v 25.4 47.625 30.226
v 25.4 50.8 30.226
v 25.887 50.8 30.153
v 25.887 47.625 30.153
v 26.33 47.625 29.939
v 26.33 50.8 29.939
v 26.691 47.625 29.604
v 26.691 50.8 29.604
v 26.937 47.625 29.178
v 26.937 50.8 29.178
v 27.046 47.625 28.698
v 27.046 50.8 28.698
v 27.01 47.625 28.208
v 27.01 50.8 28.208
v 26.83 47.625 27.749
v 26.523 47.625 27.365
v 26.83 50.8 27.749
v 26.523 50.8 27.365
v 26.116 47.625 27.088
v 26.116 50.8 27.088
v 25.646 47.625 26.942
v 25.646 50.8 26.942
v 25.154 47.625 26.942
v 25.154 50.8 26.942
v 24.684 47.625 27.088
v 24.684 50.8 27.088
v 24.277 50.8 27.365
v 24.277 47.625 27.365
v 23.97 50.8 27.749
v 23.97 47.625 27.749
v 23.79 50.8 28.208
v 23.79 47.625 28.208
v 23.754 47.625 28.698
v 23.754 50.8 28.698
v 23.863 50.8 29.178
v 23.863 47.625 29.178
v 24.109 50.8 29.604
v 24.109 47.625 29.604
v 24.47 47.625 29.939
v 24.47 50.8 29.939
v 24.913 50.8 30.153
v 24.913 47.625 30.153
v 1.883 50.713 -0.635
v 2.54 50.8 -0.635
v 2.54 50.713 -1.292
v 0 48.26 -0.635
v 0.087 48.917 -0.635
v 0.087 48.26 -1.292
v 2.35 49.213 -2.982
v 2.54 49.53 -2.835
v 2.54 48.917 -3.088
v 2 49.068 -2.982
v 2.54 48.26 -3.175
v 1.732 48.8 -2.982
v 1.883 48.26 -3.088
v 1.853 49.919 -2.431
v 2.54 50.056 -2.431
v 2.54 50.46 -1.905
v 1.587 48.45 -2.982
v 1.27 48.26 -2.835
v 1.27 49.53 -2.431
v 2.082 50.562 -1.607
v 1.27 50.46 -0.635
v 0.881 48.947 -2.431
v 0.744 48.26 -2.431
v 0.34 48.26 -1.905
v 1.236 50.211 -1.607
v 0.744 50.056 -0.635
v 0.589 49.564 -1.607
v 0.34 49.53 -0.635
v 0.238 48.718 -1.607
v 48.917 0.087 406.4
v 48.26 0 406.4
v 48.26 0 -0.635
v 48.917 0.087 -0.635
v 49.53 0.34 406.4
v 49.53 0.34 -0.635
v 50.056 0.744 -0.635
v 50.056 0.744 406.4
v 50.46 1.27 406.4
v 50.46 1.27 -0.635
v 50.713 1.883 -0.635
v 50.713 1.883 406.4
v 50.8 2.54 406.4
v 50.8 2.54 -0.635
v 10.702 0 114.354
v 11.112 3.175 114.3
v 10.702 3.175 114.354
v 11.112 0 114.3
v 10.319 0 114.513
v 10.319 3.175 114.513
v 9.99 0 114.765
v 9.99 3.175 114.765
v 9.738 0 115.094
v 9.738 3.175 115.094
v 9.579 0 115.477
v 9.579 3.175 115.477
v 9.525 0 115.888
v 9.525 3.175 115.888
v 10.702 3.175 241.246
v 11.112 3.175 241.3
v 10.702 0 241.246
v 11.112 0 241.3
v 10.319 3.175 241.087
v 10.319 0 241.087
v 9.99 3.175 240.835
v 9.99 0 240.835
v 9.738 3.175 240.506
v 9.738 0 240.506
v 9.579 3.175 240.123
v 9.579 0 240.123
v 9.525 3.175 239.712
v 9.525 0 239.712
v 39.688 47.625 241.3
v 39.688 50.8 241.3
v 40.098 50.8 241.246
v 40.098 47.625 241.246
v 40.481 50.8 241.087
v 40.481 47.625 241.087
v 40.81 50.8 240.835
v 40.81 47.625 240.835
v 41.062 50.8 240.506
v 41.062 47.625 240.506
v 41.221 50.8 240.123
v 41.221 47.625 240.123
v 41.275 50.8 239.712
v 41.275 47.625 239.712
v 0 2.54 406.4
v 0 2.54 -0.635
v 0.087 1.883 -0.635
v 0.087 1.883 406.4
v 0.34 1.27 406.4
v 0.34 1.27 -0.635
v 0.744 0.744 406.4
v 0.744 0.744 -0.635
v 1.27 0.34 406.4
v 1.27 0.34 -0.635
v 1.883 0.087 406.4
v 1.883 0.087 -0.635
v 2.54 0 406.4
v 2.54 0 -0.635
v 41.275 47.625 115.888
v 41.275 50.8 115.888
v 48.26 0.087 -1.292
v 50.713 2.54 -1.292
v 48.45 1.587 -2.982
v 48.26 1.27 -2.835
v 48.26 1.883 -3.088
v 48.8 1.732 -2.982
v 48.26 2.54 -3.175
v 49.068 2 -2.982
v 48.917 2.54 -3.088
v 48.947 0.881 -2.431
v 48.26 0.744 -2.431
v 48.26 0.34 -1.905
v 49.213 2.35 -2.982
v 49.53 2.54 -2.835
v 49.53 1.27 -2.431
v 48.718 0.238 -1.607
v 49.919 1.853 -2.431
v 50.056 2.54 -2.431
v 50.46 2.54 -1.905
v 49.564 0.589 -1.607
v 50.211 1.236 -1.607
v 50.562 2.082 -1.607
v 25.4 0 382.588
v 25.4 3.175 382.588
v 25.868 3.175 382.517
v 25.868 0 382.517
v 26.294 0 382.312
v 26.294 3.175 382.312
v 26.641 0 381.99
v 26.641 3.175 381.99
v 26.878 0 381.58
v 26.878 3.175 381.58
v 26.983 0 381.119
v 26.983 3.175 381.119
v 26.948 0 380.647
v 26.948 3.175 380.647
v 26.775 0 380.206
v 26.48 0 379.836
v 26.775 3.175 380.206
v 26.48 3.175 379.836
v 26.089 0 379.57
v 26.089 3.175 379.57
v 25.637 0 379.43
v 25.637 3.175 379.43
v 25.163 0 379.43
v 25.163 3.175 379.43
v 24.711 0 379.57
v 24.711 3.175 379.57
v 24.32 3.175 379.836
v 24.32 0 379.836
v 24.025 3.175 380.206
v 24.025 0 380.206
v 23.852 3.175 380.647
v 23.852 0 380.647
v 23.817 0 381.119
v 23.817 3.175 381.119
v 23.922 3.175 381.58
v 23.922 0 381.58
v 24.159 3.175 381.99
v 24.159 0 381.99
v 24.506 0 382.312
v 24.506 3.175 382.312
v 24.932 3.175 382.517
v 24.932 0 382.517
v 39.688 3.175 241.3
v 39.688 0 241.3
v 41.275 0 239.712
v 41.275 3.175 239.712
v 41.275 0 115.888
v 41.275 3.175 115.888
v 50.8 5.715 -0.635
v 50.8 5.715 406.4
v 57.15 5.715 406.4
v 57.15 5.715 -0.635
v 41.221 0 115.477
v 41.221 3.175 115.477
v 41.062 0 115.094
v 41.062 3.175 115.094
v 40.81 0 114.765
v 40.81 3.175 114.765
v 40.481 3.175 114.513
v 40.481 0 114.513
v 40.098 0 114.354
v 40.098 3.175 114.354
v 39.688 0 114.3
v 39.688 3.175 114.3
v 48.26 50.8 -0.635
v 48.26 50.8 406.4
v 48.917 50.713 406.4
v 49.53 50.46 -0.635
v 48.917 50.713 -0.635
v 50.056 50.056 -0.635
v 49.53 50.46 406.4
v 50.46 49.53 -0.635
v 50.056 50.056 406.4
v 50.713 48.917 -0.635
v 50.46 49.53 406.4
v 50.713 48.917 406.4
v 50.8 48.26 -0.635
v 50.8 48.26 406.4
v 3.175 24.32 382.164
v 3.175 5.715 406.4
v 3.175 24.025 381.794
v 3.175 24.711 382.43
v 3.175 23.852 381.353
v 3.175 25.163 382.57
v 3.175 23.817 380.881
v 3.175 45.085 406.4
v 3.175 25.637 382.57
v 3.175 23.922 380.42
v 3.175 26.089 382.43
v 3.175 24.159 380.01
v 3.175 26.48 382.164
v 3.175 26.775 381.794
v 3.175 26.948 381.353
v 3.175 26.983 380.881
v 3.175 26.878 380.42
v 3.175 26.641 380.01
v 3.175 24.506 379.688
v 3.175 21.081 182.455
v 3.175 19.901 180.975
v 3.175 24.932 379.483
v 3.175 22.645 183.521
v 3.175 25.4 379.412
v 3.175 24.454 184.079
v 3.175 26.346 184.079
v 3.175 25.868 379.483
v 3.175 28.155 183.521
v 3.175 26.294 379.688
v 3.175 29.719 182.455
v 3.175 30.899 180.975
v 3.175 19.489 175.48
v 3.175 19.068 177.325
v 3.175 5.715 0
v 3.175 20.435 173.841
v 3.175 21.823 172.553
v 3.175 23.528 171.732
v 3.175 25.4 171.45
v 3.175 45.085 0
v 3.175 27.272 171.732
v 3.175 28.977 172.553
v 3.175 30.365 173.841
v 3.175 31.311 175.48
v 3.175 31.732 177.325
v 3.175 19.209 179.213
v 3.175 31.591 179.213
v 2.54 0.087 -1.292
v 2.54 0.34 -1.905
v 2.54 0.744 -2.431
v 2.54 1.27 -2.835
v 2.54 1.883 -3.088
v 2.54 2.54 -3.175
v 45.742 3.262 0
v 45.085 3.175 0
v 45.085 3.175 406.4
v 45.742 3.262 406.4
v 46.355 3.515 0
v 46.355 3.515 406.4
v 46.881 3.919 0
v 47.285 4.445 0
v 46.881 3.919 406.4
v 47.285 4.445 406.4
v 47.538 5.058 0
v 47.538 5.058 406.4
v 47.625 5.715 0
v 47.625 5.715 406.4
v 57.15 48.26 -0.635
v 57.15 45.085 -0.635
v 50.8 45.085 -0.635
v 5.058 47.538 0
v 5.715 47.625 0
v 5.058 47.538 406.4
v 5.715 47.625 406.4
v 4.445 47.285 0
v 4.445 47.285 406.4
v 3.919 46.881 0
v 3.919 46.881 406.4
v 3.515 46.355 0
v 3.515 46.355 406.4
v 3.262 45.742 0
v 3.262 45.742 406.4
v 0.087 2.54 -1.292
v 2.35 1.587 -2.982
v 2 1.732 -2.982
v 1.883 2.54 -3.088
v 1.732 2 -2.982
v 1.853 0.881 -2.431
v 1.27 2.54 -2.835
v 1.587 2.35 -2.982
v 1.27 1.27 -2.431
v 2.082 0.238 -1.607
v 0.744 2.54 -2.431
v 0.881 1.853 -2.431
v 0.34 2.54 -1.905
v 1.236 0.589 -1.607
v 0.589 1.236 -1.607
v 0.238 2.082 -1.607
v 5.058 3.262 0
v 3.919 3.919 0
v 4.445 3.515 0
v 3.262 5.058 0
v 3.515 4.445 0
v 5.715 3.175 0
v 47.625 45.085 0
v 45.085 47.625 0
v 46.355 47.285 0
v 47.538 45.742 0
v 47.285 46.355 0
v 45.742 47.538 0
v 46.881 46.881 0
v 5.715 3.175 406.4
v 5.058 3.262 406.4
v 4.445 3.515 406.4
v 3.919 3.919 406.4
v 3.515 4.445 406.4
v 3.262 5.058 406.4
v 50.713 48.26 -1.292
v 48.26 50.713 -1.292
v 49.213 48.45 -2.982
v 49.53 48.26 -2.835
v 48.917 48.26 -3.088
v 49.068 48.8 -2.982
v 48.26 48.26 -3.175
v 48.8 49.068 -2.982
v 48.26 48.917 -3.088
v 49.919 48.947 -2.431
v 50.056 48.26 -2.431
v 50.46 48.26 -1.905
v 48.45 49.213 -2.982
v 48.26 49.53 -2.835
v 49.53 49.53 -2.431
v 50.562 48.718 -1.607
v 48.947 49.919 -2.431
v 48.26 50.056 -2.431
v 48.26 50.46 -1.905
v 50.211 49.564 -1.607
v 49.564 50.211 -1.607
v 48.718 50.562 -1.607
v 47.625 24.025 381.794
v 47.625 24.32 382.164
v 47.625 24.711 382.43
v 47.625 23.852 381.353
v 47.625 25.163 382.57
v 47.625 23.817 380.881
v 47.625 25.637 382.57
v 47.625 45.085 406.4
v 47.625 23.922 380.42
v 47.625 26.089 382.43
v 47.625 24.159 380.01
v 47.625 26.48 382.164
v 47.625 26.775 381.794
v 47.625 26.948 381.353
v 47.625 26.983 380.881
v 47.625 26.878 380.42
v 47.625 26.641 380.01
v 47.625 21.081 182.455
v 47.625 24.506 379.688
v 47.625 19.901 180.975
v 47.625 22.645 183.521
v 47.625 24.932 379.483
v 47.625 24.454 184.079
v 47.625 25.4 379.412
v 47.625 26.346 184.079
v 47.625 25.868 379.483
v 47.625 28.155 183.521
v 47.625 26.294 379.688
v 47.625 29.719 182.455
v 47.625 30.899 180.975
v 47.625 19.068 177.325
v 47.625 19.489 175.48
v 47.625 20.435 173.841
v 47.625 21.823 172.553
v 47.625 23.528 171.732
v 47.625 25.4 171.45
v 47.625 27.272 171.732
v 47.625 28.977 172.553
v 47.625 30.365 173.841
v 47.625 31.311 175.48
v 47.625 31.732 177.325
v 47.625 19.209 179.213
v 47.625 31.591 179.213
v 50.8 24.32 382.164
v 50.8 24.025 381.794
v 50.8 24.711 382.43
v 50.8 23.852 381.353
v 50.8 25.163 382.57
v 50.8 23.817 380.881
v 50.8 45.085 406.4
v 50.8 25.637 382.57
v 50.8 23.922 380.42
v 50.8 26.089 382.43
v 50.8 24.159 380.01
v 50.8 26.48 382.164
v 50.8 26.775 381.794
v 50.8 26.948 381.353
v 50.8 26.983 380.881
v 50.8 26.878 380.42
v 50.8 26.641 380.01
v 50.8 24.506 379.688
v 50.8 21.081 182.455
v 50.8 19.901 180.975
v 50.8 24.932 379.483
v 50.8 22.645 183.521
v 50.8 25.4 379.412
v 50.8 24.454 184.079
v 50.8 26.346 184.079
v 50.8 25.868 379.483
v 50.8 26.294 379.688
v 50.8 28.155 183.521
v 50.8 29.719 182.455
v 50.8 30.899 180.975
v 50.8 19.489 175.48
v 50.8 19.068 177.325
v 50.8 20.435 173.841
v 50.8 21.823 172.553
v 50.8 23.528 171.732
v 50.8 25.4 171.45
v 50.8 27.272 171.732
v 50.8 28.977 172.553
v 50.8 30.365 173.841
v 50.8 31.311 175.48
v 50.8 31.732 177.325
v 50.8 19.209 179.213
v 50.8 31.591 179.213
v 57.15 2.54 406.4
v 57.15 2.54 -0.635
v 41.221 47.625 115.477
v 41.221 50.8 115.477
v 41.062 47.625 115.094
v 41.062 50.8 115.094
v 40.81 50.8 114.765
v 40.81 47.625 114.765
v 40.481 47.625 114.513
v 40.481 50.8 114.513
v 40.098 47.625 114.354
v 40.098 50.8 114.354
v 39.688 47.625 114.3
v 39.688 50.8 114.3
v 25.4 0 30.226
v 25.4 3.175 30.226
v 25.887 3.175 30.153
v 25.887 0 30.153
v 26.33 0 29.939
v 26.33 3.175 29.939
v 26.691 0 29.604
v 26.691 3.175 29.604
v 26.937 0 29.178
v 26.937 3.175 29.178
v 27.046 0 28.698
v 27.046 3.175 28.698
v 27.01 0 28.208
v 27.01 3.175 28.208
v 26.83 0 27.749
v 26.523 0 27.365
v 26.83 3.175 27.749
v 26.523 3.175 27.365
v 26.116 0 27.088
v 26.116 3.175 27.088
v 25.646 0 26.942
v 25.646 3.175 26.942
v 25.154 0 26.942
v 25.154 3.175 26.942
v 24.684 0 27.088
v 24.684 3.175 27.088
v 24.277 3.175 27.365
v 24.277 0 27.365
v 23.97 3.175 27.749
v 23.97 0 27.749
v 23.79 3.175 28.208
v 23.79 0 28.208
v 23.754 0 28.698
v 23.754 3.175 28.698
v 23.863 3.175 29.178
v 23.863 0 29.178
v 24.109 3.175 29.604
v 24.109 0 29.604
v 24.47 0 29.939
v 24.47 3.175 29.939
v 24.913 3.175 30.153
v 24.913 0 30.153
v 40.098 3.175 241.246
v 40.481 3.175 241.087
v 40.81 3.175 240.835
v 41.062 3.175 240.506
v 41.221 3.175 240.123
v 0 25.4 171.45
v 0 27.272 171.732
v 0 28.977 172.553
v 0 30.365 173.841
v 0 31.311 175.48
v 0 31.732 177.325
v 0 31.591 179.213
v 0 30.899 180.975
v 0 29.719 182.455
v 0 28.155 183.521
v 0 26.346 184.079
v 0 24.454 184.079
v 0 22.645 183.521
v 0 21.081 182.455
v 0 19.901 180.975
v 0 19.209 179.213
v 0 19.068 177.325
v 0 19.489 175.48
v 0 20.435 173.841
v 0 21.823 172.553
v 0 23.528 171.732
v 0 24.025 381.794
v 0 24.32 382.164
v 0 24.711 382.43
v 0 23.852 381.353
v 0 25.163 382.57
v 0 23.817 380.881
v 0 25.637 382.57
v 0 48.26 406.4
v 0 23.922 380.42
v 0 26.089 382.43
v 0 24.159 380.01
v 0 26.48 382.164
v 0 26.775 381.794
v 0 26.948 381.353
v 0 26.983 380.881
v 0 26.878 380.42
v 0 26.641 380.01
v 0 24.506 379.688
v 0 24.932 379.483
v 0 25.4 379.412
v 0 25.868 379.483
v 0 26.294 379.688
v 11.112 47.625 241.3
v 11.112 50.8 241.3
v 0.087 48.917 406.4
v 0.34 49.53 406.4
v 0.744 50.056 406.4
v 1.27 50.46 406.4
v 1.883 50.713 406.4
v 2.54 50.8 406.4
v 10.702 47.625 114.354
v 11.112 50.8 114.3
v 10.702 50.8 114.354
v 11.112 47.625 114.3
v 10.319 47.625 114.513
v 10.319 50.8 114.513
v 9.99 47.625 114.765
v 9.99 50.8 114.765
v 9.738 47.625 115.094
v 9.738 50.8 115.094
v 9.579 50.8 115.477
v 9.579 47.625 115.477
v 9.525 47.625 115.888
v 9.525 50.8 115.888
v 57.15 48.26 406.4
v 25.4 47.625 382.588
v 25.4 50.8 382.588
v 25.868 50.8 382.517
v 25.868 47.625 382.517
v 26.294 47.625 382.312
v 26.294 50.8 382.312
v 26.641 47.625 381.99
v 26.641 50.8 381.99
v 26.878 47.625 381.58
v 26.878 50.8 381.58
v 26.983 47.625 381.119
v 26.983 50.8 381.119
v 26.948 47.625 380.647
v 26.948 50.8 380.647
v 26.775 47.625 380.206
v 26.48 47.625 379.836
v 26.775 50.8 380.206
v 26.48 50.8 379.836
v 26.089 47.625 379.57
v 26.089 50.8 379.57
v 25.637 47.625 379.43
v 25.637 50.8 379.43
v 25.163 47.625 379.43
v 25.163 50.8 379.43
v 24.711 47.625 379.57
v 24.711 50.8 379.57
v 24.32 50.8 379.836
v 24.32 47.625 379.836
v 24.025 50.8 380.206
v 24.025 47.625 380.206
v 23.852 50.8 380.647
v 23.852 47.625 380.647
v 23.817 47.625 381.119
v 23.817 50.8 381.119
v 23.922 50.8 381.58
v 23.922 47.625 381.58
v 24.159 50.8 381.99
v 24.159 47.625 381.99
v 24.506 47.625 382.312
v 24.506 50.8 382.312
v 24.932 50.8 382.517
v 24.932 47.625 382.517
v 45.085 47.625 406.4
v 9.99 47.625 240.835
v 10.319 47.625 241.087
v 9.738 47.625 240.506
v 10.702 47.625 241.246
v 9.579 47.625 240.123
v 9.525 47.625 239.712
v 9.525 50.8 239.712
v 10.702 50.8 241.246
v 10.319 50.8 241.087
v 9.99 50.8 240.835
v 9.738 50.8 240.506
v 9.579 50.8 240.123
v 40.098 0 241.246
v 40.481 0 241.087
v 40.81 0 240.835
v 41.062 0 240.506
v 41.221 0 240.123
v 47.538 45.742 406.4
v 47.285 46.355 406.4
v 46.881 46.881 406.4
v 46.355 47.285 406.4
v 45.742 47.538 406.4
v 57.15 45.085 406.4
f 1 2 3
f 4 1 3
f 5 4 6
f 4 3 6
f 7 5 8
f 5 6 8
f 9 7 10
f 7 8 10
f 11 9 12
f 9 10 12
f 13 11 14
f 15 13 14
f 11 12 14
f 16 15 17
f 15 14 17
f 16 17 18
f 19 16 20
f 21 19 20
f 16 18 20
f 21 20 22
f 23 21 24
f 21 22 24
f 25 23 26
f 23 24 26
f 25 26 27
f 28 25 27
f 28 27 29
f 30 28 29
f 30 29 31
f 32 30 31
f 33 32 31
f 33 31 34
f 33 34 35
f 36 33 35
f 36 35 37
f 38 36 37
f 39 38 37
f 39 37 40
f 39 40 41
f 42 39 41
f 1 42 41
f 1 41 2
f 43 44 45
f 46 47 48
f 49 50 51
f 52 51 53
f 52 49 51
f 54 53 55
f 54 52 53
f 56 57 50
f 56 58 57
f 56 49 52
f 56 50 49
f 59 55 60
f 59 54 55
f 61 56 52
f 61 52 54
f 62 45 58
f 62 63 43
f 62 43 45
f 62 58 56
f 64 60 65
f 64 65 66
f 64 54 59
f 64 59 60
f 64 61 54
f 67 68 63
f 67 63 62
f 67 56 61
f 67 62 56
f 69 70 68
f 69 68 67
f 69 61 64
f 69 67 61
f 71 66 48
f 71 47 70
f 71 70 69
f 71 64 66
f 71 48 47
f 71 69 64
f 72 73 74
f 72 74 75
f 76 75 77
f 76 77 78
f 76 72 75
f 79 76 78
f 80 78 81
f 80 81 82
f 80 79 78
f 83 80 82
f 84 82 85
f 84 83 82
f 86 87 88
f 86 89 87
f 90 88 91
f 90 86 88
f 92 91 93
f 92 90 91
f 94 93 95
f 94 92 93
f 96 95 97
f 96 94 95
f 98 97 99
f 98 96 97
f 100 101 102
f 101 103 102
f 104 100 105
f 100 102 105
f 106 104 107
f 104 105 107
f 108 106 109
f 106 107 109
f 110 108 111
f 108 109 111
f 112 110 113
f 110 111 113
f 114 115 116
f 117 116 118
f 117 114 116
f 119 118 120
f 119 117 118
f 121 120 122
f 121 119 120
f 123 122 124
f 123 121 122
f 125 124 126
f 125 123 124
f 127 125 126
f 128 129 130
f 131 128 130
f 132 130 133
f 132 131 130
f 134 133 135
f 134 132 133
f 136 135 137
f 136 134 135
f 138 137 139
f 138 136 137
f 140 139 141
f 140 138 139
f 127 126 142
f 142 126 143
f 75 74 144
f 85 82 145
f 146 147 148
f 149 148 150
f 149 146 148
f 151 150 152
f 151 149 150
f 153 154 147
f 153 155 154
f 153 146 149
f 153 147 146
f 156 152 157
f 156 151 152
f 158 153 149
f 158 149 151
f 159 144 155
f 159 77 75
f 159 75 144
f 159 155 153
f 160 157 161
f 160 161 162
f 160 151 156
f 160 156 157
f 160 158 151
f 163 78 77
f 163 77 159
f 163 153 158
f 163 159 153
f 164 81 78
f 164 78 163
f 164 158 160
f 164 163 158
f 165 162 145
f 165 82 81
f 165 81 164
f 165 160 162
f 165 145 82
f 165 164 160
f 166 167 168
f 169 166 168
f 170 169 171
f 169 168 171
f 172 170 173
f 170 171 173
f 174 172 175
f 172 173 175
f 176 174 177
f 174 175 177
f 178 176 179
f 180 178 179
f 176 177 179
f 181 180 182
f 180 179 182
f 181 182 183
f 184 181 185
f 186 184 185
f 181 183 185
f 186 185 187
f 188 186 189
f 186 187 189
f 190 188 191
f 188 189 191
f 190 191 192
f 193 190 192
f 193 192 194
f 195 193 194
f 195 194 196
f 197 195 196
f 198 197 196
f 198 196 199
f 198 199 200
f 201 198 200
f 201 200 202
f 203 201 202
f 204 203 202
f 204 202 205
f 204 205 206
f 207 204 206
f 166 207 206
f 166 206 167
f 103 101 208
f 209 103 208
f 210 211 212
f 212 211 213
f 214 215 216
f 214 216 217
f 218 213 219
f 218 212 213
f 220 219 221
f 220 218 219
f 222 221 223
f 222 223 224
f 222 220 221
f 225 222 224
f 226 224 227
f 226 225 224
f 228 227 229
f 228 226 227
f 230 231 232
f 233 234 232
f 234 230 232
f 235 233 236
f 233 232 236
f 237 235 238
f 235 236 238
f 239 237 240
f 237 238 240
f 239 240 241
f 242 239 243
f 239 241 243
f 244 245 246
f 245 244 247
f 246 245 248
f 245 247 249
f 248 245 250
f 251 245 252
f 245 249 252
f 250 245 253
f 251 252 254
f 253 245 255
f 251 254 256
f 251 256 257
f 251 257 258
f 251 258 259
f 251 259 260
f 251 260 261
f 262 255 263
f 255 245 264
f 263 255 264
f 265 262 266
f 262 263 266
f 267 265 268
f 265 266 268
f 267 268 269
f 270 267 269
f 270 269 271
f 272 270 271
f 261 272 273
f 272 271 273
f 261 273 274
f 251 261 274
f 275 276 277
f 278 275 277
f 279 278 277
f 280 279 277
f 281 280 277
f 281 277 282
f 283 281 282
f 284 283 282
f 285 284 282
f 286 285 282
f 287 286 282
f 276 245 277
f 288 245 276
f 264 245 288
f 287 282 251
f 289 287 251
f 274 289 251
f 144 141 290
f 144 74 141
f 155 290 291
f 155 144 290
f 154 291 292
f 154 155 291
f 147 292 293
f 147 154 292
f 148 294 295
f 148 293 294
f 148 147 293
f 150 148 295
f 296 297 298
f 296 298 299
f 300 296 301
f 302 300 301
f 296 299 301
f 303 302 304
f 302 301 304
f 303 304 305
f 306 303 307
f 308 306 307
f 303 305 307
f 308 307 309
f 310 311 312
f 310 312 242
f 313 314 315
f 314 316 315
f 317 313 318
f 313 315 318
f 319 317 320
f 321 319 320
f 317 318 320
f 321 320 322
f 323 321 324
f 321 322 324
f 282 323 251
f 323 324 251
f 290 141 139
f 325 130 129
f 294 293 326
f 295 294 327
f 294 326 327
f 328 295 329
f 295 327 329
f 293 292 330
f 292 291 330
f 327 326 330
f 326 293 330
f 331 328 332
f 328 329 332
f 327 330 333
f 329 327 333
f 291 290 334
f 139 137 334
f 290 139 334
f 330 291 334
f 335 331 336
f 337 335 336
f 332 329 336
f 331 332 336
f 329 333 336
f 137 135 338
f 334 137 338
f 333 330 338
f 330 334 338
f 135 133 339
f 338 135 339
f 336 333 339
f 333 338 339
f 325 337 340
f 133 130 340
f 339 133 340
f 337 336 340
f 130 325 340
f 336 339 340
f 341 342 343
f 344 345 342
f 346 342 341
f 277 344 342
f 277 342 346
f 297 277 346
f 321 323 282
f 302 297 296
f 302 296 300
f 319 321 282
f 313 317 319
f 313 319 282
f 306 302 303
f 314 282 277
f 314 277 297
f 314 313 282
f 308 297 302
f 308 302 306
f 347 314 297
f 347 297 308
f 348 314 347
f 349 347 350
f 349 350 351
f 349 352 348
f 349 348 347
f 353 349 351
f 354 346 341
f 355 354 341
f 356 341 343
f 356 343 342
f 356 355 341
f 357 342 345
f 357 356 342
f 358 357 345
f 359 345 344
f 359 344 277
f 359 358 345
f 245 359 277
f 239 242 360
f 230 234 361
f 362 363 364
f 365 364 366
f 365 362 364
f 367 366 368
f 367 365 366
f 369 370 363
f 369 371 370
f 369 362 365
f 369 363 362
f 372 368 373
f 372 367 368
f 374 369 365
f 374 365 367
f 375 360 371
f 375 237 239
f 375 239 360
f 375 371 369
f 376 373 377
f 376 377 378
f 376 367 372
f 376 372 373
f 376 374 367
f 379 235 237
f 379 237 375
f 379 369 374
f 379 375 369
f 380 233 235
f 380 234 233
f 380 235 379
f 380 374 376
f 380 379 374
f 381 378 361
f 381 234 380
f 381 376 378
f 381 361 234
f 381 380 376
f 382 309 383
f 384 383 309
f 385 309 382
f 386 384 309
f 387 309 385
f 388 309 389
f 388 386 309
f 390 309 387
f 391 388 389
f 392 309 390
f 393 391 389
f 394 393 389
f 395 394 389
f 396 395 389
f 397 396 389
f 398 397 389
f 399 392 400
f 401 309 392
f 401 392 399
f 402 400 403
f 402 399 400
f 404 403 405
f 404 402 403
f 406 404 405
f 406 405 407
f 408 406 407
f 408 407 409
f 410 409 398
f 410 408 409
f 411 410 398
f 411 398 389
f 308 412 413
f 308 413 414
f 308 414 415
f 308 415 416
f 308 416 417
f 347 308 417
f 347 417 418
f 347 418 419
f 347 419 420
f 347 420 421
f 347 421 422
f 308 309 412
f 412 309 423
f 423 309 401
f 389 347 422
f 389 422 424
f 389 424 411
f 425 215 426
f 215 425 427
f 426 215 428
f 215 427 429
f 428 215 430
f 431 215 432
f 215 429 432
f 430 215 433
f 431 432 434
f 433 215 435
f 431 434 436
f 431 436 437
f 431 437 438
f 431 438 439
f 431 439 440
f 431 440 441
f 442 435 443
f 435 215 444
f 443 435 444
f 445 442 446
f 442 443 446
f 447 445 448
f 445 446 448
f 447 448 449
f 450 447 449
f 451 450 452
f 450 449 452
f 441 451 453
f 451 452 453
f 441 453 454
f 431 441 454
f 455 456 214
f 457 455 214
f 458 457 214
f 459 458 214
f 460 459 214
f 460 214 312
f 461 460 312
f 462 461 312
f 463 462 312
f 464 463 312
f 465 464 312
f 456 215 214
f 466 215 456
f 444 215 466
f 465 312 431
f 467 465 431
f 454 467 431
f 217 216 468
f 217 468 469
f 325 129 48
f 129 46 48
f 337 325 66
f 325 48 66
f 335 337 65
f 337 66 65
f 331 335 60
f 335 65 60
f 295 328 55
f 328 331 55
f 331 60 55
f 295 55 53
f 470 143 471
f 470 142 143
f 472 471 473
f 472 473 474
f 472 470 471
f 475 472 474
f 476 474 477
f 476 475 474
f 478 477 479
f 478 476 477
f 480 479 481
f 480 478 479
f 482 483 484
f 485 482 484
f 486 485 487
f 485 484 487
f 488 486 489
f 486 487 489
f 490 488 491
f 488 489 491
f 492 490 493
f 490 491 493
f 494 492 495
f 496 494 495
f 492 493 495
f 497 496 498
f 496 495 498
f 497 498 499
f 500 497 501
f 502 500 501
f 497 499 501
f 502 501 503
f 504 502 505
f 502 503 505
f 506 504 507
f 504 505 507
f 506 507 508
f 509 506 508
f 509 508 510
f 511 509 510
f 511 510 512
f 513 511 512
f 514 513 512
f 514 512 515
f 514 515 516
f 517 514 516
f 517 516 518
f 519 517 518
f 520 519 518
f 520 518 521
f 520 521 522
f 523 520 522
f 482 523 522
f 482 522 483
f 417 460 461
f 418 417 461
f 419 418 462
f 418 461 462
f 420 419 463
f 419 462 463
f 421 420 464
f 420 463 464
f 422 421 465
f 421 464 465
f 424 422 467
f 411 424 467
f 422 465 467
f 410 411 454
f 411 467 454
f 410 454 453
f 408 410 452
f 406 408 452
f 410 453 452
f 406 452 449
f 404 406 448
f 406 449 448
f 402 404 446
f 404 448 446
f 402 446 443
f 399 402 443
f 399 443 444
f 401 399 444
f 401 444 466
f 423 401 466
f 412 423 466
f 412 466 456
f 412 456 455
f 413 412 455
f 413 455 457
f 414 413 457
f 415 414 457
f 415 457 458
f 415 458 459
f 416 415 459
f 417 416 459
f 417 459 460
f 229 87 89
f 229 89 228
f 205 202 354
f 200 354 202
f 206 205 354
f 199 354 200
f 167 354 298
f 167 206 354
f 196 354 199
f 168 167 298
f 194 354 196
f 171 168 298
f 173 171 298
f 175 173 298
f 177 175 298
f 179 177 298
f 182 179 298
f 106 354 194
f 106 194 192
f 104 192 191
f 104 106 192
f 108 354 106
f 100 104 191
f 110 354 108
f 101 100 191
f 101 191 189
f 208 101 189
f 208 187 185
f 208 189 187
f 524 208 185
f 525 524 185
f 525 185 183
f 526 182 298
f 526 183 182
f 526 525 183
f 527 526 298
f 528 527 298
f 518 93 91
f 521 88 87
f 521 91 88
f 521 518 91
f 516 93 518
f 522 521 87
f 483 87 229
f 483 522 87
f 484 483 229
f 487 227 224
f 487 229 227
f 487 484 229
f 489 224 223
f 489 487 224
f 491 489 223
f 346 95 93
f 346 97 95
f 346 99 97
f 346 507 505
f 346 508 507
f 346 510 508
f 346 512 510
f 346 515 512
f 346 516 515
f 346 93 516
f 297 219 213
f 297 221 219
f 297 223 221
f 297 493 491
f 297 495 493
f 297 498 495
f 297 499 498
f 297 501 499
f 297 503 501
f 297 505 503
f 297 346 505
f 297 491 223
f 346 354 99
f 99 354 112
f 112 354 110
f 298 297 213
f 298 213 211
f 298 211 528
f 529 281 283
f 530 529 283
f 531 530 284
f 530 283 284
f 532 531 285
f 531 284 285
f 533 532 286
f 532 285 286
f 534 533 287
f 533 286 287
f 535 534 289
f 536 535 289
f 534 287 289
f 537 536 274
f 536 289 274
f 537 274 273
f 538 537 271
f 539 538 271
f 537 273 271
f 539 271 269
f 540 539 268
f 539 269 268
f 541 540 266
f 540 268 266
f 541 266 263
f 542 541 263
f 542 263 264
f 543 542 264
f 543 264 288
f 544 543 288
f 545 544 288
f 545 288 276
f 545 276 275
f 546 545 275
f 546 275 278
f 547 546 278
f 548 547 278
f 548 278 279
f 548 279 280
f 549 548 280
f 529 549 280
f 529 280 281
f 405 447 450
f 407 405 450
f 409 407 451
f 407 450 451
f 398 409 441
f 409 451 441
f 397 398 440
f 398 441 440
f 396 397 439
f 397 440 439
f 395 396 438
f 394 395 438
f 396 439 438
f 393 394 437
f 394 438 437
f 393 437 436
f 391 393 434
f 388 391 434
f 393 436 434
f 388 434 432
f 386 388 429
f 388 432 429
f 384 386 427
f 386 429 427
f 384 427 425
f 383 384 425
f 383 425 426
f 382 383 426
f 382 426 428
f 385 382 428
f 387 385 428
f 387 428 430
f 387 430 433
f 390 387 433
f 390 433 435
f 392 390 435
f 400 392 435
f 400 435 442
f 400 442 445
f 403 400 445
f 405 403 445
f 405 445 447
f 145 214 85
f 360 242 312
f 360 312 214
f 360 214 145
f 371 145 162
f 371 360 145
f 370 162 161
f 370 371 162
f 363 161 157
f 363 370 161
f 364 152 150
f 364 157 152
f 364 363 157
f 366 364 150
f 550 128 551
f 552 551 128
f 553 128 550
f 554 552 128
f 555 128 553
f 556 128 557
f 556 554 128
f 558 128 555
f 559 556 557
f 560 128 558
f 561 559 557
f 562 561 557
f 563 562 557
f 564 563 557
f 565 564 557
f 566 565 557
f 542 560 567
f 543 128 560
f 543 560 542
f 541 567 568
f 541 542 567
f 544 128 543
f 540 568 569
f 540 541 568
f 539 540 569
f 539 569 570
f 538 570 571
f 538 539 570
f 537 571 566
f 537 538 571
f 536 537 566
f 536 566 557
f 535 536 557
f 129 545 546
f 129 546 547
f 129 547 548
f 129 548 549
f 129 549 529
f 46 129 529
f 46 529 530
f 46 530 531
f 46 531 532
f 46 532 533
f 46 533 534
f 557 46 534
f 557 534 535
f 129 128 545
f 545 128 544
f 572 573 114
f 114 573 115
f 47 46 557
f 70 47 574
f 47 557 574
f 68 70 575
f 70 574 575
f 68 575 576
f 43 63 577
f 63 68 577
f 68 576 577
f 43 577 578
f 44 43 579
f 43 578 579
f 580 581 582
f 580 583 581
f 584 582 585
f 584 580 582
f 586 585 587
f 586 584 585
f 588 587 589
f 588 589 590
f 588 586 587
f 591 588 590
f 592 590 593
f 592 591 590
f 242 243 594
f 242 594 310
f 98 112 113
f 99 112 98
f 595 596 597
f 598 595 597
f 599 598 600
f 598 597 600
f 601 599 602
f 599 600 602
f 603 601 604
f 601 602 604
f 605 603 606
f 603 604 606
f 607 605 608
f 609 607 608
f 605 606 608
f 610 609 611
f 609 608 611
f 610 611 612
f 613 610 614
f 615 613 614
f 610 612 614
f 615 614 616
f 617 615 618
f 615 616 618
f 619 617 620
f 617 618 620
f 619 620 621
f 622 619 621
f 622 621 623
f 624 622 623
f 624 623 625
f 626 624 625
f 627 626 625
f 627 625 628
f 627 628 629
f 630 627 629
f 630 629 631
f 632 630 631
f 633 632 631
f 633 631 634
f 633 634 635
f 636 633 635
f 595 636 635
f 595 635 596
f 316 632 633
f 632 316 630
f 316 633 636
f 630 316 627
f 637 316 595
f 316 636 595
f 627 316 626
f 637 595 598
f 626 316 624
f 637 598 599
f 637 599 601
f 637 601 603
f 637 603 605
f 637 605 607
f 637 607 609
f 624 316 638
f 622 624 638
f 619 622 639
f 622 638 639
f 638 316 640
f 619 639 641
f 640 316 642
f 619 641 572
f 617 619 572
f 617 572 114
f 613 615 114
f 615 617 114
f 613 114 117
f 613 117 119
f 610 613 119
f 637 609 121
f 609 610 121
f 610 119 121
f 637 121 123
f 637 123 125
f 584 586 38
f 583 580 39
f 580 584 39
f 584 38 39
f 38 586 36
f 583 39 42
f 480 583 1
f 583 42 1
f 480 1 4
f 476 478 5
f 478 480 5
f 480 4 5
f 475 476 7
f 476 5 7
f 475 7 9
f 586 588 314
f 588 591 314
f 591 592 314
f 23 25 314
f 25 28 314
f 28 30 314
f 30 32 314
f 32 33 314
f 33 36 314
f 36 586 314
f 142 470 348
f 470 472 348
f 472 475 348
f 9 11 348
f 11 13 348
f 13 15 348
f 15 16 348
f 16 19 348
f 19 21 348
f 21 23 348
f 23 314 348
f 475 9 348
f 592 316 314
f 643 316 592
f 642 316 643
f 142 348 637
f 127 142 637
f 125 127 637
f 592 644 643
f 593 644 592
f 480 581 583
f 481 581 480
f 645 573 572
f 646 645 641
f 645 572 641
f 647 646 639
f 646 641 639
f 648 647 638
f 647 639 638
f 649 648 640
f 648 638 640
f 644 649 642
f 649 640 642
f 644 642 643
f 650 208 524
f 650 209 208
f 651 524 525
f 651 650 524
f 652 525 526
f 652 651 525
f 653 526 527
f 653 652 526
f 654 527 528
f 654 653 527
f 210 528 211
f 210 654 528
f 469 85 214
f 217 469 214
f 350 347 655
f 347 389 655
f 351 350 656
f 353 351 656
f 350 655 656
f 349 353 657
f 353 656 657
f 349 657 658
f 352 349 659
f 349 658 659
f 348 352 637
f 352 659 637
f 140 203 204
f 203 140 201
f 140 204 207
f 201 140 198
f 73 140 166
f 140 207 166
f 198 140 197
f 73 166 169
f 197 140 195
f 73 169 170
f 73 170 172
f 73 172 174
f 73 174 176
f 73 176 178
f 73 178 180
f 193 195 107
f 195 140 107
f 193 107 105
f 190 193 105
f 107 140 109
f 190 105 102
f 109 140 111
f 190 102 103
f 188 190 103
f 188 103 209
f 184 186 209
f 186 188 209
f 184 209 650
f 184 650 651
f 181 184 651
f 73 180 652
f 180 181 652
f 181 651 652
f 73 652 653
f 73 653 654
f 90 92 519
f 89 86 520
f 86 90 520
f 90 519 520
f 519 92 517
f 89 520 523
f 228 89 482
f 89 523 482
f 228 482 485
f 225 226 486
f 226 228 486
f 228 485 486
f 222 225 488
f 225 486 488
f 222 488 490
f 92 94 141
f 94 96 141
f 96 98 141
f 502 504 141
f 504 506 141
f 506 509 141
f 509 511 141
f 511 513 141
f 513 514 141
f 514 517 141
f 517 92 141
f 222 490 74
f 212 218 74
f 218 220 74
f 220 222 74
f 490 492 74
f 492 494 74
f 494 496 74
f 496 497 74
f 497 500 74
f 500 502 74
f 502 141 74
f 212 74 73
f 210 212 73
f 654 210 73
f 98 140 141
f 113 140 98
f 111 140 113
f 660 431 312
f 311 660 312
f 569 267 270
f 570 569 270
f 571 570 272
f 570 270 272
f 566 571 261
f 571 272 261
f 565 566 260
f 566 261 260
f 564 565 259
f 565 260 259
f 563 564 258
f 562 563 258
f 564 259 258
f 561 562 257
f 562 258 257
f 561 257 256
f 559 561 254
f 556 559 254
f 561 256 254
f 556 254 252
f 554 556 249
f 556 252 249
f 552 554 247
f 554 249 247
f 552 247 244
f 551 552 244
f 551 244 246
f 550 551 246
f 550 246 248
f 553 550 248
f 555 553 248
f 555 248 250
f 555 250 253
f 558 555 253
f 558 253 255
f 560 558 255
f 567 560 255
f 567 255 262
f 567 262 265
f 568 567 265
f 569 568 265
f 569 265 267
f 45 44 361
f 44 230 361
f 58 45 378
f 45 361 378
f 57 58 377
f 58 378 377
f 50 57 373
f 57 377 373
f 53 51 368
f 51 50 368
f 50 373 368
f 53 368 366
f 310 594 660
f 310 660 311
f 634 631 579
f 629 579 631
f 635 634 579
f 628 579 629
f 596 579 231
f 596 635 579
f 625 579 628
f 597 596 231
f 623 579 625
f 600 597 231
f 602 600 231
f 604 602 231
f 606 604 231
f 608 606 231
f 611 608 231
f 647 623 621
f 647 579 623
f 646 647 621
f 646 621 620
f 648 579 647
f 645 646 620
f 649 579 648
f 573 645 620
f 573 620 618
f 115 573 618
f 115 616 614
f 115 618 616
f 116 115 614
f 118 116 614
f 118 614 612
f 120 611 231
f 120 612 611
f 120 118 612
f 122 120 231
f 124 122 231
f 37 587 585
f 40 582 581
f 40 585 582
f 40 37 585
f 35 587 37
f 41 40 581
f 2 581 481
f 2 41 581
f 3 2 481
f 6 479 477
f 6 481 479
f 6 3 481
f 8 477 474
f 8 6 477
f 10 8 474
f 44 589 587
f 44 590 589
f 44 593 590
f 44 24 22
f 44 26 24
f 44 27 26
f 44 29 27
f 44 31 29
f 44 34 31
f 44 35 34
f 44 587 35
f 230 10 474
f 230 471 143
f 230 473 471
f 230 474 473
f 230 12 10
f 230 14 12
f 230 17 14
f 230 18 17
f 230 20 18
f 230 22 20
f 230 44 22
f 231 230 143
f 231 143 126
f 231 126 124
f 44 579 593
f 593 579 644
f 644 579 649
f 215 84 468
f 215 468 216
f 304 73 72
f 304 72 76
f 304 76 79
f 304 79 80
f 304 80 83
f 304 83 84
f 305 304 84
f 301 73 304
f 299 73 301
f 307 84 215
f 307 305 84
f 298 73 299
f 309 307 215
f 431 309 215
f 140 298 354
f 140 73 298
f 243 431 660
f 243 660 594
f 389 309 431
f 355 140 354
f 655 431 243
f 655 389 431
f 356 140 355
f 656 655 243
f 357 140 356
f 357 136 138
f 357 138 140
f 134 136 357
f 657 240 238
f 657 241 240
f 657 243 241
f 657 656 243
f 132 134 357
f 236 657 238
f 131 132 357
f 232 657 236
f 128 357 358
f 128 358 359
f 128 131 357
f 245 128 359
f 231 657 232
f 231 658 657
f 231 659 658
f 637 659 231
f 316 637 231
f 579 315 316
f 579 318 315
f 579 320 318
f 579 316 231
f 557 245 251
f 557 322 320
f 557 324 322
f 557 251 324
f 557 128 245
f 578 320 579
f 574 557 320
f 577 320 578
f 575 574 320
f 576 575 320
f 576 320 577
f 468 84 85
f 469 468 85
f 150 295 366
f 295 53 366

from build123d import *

# Parameters (mm, degrees)
BOSS_EXTRUDE1_DEPTH      = 406.4
BOSS_EXTRUDE1_DEPTH_BACK = 3.175
SKETCH1_W                = 50.8
SKETCH1_H                = 50.8
SKETCH1_W_2              = 44.45
SKETCH1_H_2              = 44.45
SKETCH1_3_W              = 44.45
SKETCH1_3_H              = 44.45
SKETCH1_3_W_2            = 25.4
SKETCH1_3_H_2            = 25.4
BOSS_EXTRUDE2_DEPTH      = 3.175
SKETCH1_4_W              = 25.4
SKETCH1_4_H              = 25.4
BOSS_EXTRUDE3_DEPTH      = 3.175
CUT_EXTRUDE3_REACH       = 414.701
SKETCH4_R                = 1.5875
SKETCH4_R_2              = 1.651
SKETCH4_W                = 31.75
SKETCH4_H                = 127
CUT_EXTRUDE4_REACH       = 414.701
SKETCH5_R                = 1.5875
SKETCH5_R_2              = 6.35
FILLET1_R                = 2.54
FILLET4_R                = 2.54
SKETCH7_W                = 407.035
SKETCH7_H                = 3.175
BOSS_EXTRUDE4_DEPTH      = 6.35
FILLET5_R                = 1.5875


with BuildPart() as part:
    # Sketch1 → Boss-Extrude1 (new, two sides: drawn at the far end of the back side and taken through both)
    with BuildSketch(Plane.XY.offset(-BOSS_EXTRUDE1_DEPTH_BACK)):
        with Locations((25.4, 25.4)):
            Rectangle(SKETCH1_W, SKETCH1_H)
        with Locations((25.4, 25.4)):
            Rectangle(SKETCH1_W_2, SKETCH1_H_2, mode=Mode.SUBTRACT)
    extrude(amount=BOSS_EXTRUDE1_DEPTH + BOSS_EXTRUDE1_DEPTH_BACK)

    # Sketch1<3> → Boss-Extrude2 (add)
    with BuildSketch(Plane.XY):
        with Locations((25.4, 25.4)):
            Rectangle(SKETCH1_3_W, SKETCH1_3_H)
        with Locations((25.4, 25.4)):
            Rectangle(SKETCH1_3_W_2, SKETCH1_3_H_2, mode=Mode.SUBTRACT)
    extrude(amount=-BOSS_EXTRUDE2_DEPTH)

    # Sketch1<4> → Boss-Extrude3 (add)
    with BuildSketch(Plane.XY):
        with Locations((25.4, 25.4)):
            Rectangle(SKETCH1_4_W, SKETCH1_4_H)
    extrude(amount=-BOSS_EXTRUDE3_DEPTH)

    # Cut-Extrude3: up to this face of the body (flat: up to its plane)
    cut_extrude3_end = Plane(part.part.faces().sort_by_distance((25.4, 0, 201.6125))[0])
    # Sketch4 → Cut-Extrude3 (cut, up to the picked face)
    with BuildSketch(Plane(origin=(0, 50.8, 0), x_dir=(1, 0, 0), z_dir=(0, 1, 0)), mode=Mode.PRIVATE) as cut_extrude3_sk1:
        with Locations(Location((25.4, -381, 0), (0, 0, 270))):
            Circle(SKETCH4_R)
    cut_extrude3_tool1 = split(extrude(cut_extrude3_sk1.sketch, amount=-CUT_EXTRUDE3_REACH, mode=Mode.PRIVATE), bisect_by=cut_extrude3_end, keep=Keep.BOTH, mode=Mode.PRIVATE)
    # Sketch4 → Cut-Extrude3 (cut, up to the picked face)
    with BuildSketch(Plane(origin=(0, 50.8, 0), x_dir=(1, 0, 0), z_dir=(0, 1, 0)), mode=Mode.PRIVATE) as cut_extrude3_sk2:
        with Locations(Location((25.4, -28.575, 0), (0, 0, 270))):
            Circle(SKETCH4_R_2)
    cut_extrude3_tool2 = split(extrude(cut_extrude3_sk2.sketch, amount=-CUT_EXTRUDE3_REACH, mode=Mode.PRIVATE), bisect_by=cut_extrude3_end, keep=Keep.BOTH, mode=Mode.PRIVATE)
    # Sketch4 → Cut-Extrude3 (cut, up to the picked face)
    with BuildSketch(Plane(origin=(0, 50.8, 0), x_dir=(1, 0, 0), z_dir=(0, 1, 0)), mode=Mode.PRIVATE) as cut_extrude3_sk3:
        with Locations((25.4, -177.8)):
            Rectangle(SKETCH4_W, SKETCH4_H)
    cut_extrude3_tool3 = split(extrude(cut_extrude3_sk3.sketch, amount=-CUT_EXTRUDE3_REACH, mode=Mode.PRIVATE), bisect_by=cut_extrude3_end, keep=Keep.BOTH, mode=Mode.PRIVATE)
    add(cut_extrude3_tool1.solids().sort_by(Axis((25.4, 50.8, 381), (0, -1, 0)))[0], mode=Mode.SUBTRACT)
    add(cut_extrude3_tool2.solids().sort_by(Axis((25.4, 50.8, 28.575), (0, -1, 0)))[0], mode=Mode.SUBTRACT)
    add(cut_extrude3_tool3.solids().sort_by(Axis((25.4, 50.8, 177.8), (0, -1, 0)))[0], mode=Mode.SUBTRACT)

    # Cut-Extrude4: up to this face of the body (flat: up to its plane)
    cut_extrude4_end = Plane(part.part.faces().sort_by_distance((0, 25.4, 201.6125))[0])
    # Sketch5 → Cut-Extrude4 (cut, up to the picked face)
    with BuildSketch(Plane(origin=(50.8, 0, 0), x_dir=(0, 0, -1), z_dir=(1, 0, 0)), mode=Mode.PRIVATE) as cut_extrude4_sk1:
        with Locations((-381, 25.4)):
            Circle(SKETCH5_R)
    cut_extrude4_tool1 = split(extrude(cut_extrude4_sk1.sketch, amount=-CUT_EXTRUDE4_REACH, mode=Mode.PRIVATE), bisect_by=cut_extrude4_end, keep=Keep.BOTH, mode=Mode.PRIVATE)
    # Sketch5 → Cut-Extrude4 (cut, up to the picked face)
    with BuildSketch(Plane(origin=(50.8, 0, 0), x_dir=(0, 0, -1), z_dir=(1, 0, 0)), mode=Mode.PRIVATE) as cut_extrude4_sk2:
        with Locations((-177.8, 25.4)):
            Circle(SKETCH5_R_2)
    cut_extrude4_tool2 = split(extrude(cut_extrude4_sk2.sketch, amount=-CUT_EXTRUDE4_REACH, mode=Mode.PRIVATE), bisect_by=cut_extrude4_end, keep=Keep.BOTH, mode=Mode.PRIVATE)
    add(cut_extrude4_tool1.solids().sort_by(Axis((50.8, 25.4, 381), (-1, 0, 0)))[0], mode=Mode.SUBTRACT)
    add(cut_extrude4_tool2.solids().sort_by(Axis((50.8, 25.4, 177.8), (-1, 0, 0)))[0], mode=Mode.SUBTRACT)

    # Fillet1
    fillet1_edges = [part.edges().sort_by_distance(p)[0] for p in [
        (0, 0, 201.6125),
        (0, 50.8, 201.6125),
        (50.8, 50.8, 201.6125),
        (50.8, 0, 201.6125),
        (25.4, 0, -3.175),
        (50.8, 25.4, -3.175),
        (25.4, 50.8, -3.175),
        (0, 25.4, -3.175),
    ]]
    fillet(fillet1_edges, radius=FILLET1_R)

    # Fillet4
    fillet4_edges = [part.edges().sort_by_distance(p)[0] for p in [
        (3.175, 47.625, 203.2),
        (3.175, 3.175, 203.2),
        (47.625, 47.625, 203.2),
        (47.625, 3.175, 203.2),
    ]]
    fillet(fillet4_edges, radius=FILLET4_R)

    # Sketch7 → Boss-Extrude4 (add)
    with BuildSketch(Plane(origin=(50.8, 0, 0), x_dir=(0, 0, -1), z_dir=(1, 0, 0))):
        with Locations((-202.8825, 46.6725)):
            Rectangle(SKETCH7_W, SKETCH7_H)
        with Locations((-202.8825, 4.1275)):
            Rectangle(SKETCH7_W, SKETCH7_H)
    extrude(amount=BOSS_EXTRUDE4_DEPTH)

    # Fillet5
    fillet5_edges = [part.edges().sort_by_distance(p)[0] for p in [
        (9.525, 1.5875, 114.3),
        (9.525, 1.5875, 241.3),
        (41.275, 1.5875, 241.3),
        (41.275, 1.5875, 114.3),
        (9.525, 49.2125, 114.3),
        (9.525, 49.2125, 241.3),
        (41.275, 49.2125, 241.3),
        (41.275, 49.2125, 114.3),
    ]]
    fillet(fillet5_edges, radius=FILLET5_R)


solid = part.part
